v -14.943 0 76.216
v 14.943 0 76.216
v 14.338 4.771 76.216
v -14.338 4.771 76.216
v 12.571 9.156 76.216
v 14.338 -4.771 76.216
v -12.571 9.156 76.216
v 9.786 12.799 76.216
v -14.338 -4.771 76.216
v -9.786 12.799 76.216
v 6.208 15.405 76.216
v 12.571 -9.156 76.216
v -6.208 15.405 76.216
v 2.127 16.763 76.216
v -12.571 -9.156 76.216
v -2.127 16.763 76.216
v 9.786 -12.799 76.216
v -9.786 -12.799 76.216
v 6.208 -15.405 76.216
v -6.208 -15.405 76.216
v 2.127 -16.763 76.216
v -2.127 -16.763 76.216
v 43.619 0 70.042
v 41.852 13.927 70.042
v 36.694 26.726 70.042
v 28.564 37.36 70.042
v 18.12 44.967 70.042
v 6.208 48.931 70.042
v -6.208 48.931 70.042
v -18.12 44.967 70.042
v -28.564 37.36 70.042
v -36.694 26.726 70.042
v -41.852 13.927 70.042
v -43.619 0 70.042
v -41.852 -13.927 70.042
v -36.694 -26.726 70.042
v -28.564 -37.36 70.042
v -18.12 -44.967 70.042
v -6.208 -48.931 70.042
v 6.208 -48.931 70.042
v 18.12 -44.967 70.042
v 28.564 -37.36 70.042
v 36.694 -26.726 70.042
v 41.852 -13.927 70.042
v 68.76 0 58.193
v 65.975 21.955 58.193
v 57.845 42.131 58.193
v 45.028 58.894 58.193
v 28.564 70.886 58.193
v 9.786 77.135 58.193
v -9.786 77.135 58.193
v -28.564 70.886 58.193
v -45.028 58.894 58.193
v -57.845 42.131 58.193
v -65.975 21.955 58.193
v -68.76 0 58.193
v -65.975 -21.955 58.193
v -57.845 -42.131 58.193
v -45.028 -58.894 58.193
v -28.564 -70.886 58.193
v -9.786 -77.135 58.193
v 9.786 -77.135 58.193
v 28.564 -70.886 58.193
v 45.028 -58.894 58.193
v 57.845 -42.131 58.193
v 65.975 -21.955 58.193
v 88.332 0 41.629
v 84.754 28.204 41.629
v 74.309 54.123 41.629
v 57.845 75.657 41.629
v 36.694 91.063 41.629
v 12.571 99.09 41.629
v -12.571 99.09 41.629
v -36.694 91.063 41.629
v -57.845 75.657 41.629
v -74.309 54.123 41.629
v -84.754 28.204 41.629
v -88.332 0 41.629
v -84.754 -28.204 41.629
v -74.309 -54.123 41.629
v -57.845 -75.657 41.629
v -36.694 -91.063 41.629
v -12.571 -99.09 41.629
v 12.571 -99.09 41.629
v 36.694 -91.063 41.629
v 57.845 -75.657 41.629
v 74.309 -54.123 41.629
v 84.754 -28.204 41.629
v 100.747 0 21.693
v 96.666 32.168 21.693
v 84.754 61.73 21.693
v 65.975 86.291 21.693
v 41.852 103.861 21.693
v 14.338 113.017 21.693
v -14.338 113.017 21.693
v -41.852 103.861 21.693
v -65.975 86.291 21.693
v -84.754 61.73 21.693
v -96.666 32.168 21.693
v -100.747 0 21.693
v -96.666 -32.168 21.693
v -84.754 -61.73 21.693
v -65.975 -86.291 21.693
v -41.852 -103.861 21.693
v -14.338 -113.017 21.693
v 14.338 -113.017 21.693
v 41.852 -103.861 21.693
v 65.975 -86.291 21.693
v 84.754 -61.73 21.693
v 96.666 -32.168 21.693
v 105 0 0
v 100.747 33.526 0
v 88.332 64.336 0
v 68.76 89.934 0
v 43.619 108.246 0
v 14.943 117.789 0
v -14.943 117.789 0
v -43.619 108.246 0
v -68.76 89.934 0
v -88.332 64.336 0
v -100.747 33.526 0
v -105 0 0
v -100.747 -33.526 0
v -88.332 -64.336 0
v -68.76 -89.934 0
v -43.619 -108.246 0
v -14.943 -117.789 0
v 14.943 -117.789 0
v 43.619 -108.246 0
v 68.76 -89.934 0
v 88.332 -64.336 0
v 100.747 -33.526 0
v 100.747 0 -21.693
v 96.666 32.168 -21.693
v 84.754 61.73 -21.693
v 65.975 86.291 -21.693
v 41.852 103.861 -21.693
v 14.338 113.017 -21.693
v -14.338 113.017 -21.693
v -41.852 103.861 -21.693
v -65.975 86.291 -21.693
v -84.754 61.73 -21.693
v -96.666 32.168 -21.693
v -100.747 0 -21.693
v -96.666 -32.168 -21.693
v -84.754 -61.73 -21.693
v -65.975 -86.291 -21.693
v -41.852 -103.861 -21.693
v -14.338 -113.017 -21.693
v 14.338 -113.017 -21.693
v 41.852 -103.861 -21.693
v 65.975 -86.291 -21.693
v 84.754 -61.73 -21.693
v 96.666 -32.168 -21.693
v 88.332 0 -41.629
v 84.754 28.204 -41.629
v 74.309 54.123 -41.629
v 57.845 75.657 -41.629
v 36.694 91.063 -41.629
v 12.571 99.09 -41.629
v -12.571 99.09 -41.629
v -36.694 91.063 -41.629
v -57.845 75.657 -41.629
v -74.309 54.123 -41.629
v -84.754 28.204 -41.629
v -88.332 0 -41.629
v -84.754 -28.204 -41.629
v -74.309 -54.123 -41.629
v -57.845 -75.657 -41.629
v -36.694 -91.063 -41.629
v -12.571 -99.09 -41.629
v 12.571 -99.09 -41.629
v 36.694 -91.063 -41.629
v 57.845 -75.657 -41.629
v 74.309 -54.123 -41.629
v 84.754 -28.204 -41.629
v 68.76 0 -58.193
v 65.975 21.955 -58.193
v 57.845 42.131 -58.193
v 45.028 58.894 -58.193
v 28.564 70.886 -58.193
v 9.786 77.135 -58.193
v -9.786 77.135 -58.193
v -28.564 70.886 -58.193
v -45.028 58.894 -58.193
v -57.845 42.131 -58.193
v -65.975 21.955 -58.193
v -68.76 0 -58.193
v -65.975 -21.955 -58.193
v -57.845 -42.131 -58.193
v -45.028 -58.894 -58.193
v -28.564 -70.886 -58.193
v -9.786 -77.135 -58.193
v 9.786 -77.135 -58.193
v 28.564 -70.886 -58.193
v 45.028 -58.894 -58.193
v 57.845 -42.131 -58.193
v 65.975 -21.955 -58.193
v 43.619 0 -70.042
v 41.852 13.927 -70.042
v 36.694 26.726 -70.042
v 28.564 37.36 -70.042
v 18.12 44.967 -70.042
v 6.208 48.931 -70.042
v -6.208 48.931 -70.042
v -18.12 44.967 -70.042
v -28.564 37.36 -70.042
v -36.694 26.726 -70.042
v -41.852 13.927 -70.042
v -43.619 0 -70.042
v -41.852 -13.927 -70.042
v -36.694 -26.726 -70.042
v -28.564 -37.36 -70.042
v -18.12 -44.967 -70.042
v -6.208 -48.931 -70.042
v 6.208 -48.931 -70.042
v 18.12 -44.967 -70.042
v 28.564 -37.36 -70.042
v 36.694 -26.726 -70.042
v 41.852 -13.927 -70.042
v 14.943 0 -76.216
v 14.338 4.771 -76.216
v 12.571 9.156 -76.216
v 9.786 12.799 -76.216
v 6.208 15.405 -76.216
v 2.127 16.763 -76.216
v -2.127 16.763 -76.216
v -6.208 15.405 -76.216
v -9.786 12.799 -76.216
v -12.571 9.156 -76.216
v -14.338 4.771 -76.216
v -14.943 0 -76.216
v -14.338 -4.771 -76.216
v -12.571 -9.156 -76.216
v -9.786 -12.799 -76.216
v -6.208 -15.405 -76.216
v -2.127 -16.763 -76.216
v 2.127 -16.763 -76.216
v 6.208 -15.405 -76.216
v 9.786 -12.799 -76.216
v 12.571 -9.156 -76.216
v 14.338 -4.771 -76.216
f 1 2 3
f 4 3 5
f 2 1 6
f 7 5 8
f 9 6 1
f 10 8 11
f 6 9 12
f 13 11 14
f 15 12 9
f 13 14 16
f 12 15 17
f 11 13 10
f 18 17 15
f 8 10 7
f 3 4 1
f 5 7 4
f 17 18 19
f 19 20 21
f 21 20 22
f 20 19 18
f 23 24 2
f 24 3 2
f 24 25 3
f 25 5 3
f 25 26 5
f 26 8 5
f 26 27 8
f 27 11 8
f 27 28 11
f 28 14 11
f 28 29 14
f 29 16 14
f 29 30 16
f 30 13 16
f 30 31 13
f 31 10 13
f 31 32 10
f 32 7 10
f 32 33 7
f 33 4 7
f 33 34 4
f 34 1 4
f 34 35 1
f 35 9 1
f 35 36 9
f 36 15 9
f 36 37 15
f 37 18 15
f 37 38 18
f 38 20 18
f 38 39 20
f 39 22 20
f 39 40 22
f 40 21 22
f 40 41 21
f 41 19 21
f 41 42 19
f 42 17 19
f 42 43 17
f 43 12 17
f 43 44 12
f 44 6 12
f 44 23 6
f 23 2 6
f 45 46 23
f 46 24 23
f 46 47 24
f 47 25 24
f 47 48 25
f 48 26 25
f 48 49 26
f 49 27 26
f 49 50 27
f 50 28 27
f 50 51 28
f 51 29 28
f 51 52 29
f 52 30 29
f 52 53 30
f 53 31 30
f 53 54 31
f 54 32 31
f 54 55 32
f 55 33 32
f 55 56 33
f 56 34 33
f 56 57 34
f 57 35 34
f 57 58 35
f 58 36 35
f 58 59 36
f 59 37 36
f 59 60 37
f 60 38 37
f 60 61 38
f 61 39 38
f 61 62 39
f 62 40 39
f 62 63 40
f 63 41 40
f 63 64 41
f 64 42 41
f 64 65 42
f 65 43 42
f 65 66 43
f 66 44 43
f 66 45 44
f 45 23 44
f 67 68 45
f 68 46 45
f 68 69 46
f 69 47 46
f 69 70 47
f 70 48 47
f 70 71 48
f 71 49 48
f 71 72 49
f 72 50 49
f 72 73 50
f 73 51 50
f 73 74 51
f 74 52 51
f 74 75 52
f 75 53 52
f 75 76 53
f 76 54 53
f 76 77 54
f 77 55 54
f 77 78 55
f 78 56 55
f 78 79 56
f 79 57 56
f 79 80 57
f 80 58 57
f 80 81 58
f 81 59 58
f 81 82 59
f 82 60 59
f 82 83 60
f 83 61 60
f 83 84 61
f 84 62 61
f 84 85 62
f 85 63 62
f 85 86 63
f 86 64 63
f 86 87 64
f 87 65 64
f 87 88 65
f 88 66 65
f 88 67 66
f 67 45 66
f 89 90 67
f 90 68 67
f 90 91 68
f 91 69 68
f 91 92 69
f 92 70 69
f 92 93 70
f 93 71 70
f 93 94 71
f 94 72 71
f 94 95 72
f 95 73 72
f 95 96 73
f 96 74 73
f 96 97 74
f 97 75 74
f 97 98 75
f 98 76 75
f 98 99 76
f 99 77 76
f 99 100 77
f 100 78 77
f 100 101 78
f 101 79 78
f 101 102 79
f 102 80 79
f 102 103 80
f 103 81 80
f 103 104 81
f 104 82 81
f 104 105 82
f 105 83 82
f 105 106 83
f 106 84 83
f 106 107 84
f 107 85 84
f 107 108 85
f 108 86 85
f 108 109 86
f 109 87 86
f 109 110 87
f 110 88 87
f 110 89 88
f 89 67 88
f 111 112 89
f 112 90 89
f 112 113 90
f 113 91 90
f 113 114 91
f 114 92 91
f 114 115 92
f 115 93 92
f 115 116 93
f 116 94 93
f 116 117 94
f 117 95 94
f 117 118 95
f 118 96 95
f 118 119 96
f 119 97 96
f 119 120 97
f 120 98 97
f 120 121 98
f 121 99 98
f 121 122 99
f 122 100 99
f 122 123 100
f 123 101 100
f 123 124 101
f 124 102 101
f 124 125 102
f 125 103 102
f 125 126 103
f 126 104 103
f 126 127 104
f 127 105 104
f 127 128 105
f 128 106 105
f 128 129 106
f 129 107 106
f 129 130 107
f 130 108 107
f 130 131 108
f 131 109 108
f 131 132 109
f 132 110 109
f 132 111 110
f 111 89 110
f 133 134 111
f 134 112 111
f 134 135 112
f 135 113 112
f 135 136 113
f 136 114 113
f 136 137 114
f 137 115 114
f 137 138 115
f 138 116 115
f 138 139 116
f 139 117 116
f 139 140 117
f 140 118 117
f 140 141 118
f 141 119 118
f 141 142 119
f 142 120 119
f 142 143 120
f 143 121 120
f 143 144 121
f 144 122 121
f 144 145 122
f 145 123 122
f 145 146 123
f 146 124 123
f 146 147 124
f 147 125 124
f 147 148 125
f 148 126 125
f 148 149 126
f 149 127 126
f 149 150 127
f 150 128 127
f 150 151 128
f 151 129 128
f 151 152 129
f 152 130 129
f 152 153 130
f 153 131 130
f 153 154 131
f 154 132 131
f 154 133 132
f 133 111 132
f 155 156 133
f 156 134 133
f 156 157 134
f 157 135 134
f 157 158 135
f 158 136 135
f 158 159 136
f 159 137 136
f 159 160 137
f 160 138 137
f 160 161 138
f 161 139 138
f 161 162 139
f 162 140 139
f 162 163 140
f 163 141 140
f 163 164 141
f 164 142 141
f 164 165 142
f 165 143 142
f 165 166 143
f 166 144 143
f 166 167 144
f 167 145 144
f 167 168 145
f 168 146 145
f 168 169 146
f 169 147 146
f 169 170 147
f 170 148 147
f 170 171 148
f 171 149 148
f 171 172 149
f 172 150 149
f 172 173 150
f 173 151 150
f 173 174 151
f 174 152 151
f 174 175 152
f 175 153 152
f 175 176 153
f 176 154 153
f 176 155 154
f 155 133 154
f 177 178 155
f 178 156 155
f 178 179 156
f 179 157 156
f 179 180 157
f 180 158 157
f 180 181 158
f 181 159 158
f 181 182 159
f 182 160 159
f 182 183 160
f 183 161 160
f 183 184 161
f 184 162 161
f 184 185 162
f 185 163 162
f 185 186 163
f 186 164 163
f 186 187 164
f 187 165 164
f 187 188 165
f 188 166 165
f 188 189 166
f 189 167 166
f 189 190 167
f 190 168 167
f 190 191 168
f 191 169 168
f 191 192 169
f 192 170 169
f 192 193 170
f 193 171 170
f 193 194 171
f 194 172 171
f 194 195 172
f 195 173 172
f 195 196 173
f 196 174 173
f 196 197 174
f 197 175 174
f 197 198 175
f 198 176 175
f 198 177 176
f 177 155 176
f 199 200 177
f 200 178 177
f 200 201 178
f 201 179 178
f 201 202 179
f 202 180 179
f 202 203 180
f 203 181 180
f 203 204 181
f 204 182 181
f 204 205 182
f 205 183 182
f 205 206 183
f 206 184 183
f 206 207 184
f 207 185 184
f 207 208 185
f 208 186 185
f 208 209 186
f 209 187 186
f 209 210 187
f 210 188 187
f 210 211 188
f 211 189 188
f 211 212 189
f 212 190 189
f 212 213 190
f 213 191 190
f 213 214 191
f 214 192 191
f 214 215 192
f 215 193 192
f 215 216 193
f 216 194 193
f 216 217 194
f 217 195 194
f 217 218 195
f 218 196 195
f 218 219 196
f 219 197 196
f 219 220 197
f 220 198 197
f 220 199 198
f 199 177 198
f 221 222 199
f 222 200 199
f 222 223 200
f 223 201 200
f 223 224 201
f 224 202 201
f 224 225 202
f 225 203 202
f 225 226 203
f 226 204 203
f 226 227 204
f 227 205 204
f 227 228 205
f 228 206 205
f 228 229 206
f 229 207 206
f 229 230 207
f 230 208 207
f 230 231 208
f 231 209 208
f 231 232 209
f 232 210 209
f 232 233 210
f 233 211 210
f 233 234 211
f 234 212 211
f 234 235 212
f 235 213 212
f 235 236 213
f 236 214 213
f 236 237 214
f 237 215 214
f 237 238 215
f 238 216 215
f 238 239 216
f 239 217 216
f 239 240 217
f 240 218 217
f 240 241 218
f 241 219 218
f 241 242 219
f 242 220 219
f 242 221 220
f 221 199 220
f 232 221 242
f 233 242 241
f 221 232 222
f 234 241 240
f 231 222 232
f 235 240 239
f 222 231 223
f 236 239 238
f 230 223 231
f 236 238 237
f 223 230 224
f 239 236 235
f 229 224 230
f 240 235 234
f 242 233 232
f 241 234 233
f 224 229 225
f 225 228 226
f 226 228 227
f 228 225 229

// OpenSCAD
// Generated by SolidPython 1.0.1 on 2020-07-29 00:46:52


scale(v = [15, 17, 11]) {
	sphere(r = 7);
}
/***********************************************
*********      SolidPython code:      **********
************************************************
 
# import packages: SolidPython
from solid import *
from solid.utils import *
from itertools import chain, combinations, permutations


class Resize:

    def __init__(self, scad_file):
        self.scad_file = scad_file
        #self.scad_file = import_scad(scad_file)
        # cone/cylinder param:
        self.r1 = 0
        self.r2 = 0
        self.h = 0
        # rectangular prism param:
        self.w = 0
        self.l = 0
        # ellipse param:
        self.r = 0

    # import OpenScad code (file name corresponds to shape)


    # classify shape + parameters
    def assign(self, param1, param2, param3):
        if self.scad_file == 'cone.scad':
            self.r1 = param1
            self.r2 = param2
            self.h = param3
        elif self.scad_file == 'cylinder.scad':
            self.r1 = param1
            self.r2 = param2
            self.h = param3
        elif self.scad_file == 'rectangularPrism.scad':
            self.h = param1
            self.l = param2
            self.w = param3
        else:
            self.r = param1
            self.h = param2

    # resize parameters
    def iterate(self):
        x = range(3, 20, 2)
        i = 1
        if self.scad_file == 'cone.scad':
            tempList = list(permutations(x, 2))
            for temp in tempList:
                param1 = temp[0]
                param2 = temp[1]
                filepath = 'produced_scad_files/' + 'cone' + str(param1) + '_' + str(param2) + '_' + '.scad'
                scad_render_to_file(cylinder(h=param1, r1=param2, r2=0), filepath)

        elif self.scad_file == 'cylinder.scad':
            tempList = list(permutations(x, 3))
            for temp in tempList:
                param1 = temp[0]
                param2 = temp[1]
                filepath = 'produced_scad_files/' + 'cylinder' + str(param1) + '_' + str(param2) + '_' + '.scad'
                scad_render_to_file(cylinder(h=param1, r1=param2, r2=param2), filepath)

        elif self.scad_file == 'rectangularPrism.scad':
            tempList = list(permutations(x, 3))
            for temp in tempList:
                param1 = temp[0]
                param2 = temp[1]
                param3 = temp[2]
                filepath = 'produced_scad_files/' + 'rectangularPrism' + str(param1) + '_' + str(param2) + '_' + str(
                    param3) + '.scad'
                scad_render_to_file(cube(size=(param1, param2, param3)), filepath)

        elif self.scad_file == 'ellipse.scad':
            tempList = list(permutations(x, 4))
            for temp in tempList:
                param1 = temp[0]
                param2 = temp[1]
                param3 = temp[2]
                param4 = temp[3]
                filepath = 'produced_scad_files/' + 'ellipse' + str(param1) + '_' + str(param2) + '_' + str(param3) + '_' + str(param4) + '.scad'
                scad_render_to_file(scale([param1, param2, param3])(sphere(r=param4)), filepath)

    def render_to_scadfile(self):
        scad_render_to_file(scad, 'example.scad') 
 
************************************************/
